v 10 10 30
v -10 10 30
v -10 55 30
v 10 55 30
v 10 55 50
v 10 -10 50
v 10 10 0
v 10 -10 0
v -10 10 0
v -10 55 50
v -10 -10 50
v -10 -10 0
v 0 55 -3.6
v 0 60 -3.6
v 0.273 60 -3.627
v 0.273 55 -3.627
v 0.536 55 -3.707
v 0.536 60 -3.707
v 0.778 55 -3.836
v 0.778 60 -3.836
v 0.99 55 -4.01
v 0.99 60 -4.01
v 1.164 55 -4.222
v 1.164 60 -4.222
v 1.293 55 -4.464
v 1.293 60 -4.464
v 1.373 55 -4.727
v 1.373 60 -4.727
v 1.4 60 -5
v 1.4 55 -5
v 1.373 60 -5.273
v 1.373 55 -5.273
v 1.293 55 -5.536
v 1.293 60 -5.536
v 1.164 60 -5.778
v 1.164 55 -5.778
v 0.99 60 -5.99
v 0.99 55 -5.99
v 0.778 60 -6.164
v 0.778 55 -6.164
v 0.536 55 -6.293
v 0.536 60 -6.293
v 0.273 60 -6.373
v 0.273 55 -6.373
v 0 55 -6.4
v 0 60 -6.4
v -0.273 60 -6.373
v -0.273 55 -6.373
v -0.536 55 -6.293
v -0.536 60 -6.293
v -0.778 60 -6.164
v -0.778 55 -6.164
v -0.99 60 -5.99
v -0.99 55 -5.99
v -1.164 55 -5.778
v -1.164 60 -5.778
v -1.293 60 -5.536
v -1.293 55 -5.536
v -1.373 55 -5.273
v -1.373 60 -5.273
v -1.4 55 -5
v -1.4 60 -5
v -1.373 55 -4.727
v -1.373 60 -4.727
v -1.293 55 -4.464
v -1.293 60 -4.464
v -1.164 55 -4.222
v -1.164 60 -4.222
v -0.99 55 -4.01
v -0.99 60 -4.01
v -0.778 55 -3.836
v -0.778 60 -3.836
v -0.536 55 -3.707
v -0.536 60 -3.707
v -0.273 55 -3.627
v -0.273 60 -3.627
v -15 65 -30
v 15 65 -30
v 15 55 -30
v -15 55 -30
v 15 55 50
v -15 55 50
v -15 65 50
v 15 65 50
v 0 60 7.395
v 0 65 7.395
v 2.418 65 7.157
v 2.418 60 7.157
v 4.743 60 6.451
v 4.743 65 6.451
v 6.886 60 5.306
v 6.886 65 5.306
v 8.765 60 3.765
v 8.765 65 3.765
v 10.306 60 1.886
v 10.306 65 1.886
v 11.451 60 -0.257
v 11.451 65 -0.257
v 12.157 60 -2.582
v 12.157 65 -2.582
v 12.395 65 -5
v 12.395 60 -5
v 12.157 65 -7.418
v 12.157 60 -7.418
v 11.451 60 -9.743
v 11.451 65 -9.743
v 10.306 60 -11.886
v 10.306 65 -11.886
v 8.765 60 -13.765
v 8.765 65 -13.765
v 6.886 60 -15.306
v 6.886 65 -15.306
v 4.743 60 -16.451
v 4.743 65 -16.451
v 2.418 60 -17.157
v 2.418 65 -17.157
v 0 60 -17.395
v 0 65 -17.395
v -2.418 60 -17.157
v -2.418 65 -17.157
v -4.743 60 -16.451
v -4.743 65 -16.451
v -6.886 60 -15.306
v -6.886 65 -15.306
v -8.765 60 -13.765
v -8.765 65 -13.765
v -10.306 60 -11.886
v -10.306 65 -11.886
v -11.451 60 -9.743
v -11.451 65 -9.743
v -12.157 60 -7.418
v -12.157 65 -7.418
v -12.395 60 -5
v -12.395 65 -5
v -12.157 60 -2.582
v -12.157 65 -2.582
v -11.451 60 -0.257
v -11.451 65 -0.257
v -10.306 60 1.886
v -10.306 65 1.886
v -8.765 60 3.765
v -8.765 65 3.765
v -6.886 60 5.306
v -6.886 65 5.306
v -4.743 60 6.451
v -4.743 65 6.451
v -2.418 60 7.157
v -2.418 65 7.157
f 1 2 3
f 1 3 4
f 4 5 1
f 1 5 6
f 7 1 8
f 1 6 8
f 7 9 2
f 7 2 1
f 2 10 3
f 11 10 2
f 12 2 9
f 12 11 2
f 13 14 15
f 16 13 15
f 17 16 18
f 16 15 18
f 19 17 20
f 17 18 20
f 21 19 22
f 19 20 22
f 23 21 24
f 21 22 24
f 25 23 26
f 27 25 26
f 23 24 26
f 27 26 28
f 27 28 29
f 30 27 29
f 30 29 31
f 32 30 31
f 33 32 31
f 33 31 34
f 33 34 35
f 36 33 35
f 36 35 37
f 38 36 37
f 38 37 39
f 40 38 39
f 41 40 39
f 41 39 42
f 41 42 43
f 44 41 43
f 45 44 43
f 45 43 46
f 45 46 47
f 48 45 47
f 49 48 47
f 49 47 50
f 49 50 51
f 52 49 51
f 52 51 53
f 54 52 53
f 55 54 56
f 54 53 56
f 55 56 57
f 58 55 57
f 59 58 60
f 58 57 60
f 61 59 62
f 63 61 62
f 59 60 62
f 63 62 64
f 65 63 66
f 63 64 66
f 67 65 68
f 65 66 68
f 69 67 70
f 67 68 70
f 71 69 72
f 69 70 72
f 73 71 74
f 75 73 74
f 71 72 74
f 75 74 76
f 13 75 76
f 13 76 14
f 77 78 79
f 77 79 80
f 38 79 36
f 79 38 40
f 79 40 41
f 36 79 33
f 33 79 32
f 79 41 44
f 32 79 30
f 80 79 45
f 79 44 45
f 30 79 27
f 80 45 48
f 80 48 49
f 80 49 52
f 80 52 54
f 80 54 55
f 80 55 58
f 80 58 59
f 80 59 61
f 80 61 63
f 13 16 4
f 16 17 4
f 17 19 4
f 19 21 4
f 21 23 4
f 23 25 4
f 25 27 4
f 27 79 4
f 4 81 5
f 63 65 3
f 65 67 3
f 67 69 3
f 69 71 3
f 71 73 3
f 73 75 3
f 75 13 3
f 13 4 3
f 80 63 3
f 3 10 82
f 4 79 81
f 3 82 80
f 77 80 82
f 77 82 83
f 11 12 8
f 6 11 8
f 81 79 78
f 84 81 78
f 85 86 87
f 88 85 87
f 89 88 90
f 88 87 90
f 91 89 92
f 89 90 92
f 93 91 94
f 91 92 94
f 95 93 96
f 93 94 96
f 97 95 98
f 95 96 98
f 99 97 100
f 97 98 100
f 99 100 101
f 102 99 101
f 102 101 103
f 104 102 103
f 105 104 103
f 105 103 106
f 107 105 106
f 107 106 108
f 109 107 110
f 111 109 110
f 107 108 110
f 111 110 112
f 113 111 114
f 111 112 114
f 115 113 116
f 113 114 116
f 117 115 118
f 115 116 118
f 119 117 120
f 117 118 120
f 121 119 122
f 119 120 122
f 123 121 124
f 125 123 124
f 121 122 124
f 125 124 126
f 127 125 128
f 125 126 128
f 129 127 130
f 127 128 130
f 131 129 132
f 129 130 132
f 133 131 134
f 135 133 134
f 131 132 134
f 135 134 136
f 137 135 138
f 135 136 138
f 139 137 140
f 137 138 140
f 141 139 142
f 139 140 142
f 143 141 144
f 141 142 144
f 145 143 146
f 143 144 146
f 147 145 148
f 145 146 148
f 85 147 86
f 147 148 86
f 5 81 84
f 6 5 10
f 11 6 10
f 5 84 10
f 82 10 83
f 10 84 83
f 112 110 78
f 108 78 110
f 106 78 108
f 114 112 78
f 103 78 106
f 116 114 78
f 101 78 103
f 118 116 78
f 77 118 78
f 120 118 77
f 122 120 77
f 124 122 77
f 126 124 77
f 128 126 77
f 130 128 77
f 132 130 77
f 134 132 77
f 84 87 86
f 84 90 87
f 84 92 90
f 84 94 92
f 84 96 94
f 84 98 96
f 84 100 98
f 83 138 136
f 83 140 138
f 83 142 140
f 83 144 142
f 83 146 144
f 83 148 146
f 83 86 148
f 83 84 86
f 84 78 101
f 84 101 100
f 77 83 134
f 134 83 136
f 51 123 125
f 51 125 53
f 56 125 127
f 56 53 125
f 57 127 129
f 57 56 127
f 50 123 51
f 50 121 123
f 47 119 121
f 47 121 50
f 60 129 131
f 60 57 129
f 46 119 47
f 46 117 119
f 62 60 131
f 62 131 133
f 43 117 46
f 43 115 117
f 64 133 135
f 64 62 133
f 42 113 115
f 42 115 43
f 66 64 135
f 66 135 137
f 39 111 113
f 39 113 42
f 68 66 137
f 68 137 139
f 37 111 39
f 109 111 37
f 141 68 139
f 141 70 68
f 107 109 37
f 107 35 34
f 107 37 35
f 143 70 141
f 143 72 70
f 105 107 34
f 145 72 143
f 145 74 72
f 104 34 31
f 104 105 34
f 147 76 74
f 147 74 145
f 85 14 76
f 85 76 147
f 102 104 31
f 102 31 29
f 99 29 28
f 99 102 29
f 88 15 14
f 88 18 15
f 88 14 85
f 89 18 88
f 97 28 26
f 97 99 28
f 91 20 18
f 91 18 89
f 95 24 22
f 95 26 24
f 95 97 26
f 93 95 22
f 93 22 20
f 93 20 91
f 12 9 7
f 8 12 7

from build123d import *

# Parameters (mm, degrees)
CROQUIS2_W                   = 20
CROQUIS2_H                   = 20
SALIENTE_EXTRUIR1_DEPTH      = 50
CROQUIS3_W                   = 20
CROQUIS3_H                   = 20
SALIENTE_EXTRUIR2_DEPTH      = 51
SALIENTE_EXTRUIR4_DEPTH      = 60
SALIENTE_EXTRUIR4_DEPTH_BACK = 20
CROQUIS7_W                   = 30
CROQUIS7_H                   = 10
CROQUIS8_R                   = 1.4
CORTAR_EXTRUIR2_DEPTH        = 60
CROQUIS9_R                   = 12.395
CORTAR_EXTRUIR3_DEPTH        = 5


with BuildPart() as part:
    # Croquis2 → Saliente-Extruir1 (new body)
    with BuildSketch(Plane.XY):
        Rectangle(CROQUIS2_W, CROQUIS2_H)
    extrude(amount=SALIENTE_EXTRUIR1_DEPTH)

    # Croquis3 → Saliente-Extruir2 (add)
    with BuildSketch(Plane(origin=(0, 10, 0), x_dir=(1, 0, 0), z_dir=(0, 1, 0))):
        with Locations((0, -40)):
            Rectangle(CROQUIS3_W, CROQUIS3_H)
    extrude(amount=SALIENTE_EXTRUIR2_DEPTH)

    # Croquis7 → Saliente-Extruir4 (add, two sides: drawn at the far end of the back side and taken through both)
    with BuildSketch(Plane(origin=(0, 0, 30), x_dir=(-1, 0, 0), z_dir=(0, 0, -1)).offset(-SALIENTE_EXTRUIR4_DEPTH_BACK)):
        with Locations((0, 60)):
            Rectangle(CROQUIS7_W, CROQUIS7_H)
    extrude(amount=SALIENTE_EXTRUIR4_DEPTH + SALIENTE_EXTRUIR4_DEPTH_BACK)

    # Croquis8 → Cortar-Extruir2 (cut)
    with BuildSketch(Plane(origin=(0, 65, 0), x_dir=(1, 0, 0), z_dir=(0, 1, 0))):
        with Locations(Location((0, 5, 0), (0, 0, 270))):
            Circle(CROQUIS8_R)
    extrude(amount=-CORTAR_EXTRUIR2_DEPTH, mode=Mode.SUBTRACT)

    # Croquis9 → Cortar-Extruir3 (cut)
    with BuildSketch(Plane(origin=(0, 65, 0), x_dir=(1, 0, 0), z_dir=(0, 1, 0))):
        with Locations(Location((0, 5, 0), (0, 0, 270))):
            Circle(CROQUIS9_R)
    extrude(amount=-CORTAR_EXTRUIR3_DEPTH, mode=Mode.SUBTRACT)


solid = part.part
